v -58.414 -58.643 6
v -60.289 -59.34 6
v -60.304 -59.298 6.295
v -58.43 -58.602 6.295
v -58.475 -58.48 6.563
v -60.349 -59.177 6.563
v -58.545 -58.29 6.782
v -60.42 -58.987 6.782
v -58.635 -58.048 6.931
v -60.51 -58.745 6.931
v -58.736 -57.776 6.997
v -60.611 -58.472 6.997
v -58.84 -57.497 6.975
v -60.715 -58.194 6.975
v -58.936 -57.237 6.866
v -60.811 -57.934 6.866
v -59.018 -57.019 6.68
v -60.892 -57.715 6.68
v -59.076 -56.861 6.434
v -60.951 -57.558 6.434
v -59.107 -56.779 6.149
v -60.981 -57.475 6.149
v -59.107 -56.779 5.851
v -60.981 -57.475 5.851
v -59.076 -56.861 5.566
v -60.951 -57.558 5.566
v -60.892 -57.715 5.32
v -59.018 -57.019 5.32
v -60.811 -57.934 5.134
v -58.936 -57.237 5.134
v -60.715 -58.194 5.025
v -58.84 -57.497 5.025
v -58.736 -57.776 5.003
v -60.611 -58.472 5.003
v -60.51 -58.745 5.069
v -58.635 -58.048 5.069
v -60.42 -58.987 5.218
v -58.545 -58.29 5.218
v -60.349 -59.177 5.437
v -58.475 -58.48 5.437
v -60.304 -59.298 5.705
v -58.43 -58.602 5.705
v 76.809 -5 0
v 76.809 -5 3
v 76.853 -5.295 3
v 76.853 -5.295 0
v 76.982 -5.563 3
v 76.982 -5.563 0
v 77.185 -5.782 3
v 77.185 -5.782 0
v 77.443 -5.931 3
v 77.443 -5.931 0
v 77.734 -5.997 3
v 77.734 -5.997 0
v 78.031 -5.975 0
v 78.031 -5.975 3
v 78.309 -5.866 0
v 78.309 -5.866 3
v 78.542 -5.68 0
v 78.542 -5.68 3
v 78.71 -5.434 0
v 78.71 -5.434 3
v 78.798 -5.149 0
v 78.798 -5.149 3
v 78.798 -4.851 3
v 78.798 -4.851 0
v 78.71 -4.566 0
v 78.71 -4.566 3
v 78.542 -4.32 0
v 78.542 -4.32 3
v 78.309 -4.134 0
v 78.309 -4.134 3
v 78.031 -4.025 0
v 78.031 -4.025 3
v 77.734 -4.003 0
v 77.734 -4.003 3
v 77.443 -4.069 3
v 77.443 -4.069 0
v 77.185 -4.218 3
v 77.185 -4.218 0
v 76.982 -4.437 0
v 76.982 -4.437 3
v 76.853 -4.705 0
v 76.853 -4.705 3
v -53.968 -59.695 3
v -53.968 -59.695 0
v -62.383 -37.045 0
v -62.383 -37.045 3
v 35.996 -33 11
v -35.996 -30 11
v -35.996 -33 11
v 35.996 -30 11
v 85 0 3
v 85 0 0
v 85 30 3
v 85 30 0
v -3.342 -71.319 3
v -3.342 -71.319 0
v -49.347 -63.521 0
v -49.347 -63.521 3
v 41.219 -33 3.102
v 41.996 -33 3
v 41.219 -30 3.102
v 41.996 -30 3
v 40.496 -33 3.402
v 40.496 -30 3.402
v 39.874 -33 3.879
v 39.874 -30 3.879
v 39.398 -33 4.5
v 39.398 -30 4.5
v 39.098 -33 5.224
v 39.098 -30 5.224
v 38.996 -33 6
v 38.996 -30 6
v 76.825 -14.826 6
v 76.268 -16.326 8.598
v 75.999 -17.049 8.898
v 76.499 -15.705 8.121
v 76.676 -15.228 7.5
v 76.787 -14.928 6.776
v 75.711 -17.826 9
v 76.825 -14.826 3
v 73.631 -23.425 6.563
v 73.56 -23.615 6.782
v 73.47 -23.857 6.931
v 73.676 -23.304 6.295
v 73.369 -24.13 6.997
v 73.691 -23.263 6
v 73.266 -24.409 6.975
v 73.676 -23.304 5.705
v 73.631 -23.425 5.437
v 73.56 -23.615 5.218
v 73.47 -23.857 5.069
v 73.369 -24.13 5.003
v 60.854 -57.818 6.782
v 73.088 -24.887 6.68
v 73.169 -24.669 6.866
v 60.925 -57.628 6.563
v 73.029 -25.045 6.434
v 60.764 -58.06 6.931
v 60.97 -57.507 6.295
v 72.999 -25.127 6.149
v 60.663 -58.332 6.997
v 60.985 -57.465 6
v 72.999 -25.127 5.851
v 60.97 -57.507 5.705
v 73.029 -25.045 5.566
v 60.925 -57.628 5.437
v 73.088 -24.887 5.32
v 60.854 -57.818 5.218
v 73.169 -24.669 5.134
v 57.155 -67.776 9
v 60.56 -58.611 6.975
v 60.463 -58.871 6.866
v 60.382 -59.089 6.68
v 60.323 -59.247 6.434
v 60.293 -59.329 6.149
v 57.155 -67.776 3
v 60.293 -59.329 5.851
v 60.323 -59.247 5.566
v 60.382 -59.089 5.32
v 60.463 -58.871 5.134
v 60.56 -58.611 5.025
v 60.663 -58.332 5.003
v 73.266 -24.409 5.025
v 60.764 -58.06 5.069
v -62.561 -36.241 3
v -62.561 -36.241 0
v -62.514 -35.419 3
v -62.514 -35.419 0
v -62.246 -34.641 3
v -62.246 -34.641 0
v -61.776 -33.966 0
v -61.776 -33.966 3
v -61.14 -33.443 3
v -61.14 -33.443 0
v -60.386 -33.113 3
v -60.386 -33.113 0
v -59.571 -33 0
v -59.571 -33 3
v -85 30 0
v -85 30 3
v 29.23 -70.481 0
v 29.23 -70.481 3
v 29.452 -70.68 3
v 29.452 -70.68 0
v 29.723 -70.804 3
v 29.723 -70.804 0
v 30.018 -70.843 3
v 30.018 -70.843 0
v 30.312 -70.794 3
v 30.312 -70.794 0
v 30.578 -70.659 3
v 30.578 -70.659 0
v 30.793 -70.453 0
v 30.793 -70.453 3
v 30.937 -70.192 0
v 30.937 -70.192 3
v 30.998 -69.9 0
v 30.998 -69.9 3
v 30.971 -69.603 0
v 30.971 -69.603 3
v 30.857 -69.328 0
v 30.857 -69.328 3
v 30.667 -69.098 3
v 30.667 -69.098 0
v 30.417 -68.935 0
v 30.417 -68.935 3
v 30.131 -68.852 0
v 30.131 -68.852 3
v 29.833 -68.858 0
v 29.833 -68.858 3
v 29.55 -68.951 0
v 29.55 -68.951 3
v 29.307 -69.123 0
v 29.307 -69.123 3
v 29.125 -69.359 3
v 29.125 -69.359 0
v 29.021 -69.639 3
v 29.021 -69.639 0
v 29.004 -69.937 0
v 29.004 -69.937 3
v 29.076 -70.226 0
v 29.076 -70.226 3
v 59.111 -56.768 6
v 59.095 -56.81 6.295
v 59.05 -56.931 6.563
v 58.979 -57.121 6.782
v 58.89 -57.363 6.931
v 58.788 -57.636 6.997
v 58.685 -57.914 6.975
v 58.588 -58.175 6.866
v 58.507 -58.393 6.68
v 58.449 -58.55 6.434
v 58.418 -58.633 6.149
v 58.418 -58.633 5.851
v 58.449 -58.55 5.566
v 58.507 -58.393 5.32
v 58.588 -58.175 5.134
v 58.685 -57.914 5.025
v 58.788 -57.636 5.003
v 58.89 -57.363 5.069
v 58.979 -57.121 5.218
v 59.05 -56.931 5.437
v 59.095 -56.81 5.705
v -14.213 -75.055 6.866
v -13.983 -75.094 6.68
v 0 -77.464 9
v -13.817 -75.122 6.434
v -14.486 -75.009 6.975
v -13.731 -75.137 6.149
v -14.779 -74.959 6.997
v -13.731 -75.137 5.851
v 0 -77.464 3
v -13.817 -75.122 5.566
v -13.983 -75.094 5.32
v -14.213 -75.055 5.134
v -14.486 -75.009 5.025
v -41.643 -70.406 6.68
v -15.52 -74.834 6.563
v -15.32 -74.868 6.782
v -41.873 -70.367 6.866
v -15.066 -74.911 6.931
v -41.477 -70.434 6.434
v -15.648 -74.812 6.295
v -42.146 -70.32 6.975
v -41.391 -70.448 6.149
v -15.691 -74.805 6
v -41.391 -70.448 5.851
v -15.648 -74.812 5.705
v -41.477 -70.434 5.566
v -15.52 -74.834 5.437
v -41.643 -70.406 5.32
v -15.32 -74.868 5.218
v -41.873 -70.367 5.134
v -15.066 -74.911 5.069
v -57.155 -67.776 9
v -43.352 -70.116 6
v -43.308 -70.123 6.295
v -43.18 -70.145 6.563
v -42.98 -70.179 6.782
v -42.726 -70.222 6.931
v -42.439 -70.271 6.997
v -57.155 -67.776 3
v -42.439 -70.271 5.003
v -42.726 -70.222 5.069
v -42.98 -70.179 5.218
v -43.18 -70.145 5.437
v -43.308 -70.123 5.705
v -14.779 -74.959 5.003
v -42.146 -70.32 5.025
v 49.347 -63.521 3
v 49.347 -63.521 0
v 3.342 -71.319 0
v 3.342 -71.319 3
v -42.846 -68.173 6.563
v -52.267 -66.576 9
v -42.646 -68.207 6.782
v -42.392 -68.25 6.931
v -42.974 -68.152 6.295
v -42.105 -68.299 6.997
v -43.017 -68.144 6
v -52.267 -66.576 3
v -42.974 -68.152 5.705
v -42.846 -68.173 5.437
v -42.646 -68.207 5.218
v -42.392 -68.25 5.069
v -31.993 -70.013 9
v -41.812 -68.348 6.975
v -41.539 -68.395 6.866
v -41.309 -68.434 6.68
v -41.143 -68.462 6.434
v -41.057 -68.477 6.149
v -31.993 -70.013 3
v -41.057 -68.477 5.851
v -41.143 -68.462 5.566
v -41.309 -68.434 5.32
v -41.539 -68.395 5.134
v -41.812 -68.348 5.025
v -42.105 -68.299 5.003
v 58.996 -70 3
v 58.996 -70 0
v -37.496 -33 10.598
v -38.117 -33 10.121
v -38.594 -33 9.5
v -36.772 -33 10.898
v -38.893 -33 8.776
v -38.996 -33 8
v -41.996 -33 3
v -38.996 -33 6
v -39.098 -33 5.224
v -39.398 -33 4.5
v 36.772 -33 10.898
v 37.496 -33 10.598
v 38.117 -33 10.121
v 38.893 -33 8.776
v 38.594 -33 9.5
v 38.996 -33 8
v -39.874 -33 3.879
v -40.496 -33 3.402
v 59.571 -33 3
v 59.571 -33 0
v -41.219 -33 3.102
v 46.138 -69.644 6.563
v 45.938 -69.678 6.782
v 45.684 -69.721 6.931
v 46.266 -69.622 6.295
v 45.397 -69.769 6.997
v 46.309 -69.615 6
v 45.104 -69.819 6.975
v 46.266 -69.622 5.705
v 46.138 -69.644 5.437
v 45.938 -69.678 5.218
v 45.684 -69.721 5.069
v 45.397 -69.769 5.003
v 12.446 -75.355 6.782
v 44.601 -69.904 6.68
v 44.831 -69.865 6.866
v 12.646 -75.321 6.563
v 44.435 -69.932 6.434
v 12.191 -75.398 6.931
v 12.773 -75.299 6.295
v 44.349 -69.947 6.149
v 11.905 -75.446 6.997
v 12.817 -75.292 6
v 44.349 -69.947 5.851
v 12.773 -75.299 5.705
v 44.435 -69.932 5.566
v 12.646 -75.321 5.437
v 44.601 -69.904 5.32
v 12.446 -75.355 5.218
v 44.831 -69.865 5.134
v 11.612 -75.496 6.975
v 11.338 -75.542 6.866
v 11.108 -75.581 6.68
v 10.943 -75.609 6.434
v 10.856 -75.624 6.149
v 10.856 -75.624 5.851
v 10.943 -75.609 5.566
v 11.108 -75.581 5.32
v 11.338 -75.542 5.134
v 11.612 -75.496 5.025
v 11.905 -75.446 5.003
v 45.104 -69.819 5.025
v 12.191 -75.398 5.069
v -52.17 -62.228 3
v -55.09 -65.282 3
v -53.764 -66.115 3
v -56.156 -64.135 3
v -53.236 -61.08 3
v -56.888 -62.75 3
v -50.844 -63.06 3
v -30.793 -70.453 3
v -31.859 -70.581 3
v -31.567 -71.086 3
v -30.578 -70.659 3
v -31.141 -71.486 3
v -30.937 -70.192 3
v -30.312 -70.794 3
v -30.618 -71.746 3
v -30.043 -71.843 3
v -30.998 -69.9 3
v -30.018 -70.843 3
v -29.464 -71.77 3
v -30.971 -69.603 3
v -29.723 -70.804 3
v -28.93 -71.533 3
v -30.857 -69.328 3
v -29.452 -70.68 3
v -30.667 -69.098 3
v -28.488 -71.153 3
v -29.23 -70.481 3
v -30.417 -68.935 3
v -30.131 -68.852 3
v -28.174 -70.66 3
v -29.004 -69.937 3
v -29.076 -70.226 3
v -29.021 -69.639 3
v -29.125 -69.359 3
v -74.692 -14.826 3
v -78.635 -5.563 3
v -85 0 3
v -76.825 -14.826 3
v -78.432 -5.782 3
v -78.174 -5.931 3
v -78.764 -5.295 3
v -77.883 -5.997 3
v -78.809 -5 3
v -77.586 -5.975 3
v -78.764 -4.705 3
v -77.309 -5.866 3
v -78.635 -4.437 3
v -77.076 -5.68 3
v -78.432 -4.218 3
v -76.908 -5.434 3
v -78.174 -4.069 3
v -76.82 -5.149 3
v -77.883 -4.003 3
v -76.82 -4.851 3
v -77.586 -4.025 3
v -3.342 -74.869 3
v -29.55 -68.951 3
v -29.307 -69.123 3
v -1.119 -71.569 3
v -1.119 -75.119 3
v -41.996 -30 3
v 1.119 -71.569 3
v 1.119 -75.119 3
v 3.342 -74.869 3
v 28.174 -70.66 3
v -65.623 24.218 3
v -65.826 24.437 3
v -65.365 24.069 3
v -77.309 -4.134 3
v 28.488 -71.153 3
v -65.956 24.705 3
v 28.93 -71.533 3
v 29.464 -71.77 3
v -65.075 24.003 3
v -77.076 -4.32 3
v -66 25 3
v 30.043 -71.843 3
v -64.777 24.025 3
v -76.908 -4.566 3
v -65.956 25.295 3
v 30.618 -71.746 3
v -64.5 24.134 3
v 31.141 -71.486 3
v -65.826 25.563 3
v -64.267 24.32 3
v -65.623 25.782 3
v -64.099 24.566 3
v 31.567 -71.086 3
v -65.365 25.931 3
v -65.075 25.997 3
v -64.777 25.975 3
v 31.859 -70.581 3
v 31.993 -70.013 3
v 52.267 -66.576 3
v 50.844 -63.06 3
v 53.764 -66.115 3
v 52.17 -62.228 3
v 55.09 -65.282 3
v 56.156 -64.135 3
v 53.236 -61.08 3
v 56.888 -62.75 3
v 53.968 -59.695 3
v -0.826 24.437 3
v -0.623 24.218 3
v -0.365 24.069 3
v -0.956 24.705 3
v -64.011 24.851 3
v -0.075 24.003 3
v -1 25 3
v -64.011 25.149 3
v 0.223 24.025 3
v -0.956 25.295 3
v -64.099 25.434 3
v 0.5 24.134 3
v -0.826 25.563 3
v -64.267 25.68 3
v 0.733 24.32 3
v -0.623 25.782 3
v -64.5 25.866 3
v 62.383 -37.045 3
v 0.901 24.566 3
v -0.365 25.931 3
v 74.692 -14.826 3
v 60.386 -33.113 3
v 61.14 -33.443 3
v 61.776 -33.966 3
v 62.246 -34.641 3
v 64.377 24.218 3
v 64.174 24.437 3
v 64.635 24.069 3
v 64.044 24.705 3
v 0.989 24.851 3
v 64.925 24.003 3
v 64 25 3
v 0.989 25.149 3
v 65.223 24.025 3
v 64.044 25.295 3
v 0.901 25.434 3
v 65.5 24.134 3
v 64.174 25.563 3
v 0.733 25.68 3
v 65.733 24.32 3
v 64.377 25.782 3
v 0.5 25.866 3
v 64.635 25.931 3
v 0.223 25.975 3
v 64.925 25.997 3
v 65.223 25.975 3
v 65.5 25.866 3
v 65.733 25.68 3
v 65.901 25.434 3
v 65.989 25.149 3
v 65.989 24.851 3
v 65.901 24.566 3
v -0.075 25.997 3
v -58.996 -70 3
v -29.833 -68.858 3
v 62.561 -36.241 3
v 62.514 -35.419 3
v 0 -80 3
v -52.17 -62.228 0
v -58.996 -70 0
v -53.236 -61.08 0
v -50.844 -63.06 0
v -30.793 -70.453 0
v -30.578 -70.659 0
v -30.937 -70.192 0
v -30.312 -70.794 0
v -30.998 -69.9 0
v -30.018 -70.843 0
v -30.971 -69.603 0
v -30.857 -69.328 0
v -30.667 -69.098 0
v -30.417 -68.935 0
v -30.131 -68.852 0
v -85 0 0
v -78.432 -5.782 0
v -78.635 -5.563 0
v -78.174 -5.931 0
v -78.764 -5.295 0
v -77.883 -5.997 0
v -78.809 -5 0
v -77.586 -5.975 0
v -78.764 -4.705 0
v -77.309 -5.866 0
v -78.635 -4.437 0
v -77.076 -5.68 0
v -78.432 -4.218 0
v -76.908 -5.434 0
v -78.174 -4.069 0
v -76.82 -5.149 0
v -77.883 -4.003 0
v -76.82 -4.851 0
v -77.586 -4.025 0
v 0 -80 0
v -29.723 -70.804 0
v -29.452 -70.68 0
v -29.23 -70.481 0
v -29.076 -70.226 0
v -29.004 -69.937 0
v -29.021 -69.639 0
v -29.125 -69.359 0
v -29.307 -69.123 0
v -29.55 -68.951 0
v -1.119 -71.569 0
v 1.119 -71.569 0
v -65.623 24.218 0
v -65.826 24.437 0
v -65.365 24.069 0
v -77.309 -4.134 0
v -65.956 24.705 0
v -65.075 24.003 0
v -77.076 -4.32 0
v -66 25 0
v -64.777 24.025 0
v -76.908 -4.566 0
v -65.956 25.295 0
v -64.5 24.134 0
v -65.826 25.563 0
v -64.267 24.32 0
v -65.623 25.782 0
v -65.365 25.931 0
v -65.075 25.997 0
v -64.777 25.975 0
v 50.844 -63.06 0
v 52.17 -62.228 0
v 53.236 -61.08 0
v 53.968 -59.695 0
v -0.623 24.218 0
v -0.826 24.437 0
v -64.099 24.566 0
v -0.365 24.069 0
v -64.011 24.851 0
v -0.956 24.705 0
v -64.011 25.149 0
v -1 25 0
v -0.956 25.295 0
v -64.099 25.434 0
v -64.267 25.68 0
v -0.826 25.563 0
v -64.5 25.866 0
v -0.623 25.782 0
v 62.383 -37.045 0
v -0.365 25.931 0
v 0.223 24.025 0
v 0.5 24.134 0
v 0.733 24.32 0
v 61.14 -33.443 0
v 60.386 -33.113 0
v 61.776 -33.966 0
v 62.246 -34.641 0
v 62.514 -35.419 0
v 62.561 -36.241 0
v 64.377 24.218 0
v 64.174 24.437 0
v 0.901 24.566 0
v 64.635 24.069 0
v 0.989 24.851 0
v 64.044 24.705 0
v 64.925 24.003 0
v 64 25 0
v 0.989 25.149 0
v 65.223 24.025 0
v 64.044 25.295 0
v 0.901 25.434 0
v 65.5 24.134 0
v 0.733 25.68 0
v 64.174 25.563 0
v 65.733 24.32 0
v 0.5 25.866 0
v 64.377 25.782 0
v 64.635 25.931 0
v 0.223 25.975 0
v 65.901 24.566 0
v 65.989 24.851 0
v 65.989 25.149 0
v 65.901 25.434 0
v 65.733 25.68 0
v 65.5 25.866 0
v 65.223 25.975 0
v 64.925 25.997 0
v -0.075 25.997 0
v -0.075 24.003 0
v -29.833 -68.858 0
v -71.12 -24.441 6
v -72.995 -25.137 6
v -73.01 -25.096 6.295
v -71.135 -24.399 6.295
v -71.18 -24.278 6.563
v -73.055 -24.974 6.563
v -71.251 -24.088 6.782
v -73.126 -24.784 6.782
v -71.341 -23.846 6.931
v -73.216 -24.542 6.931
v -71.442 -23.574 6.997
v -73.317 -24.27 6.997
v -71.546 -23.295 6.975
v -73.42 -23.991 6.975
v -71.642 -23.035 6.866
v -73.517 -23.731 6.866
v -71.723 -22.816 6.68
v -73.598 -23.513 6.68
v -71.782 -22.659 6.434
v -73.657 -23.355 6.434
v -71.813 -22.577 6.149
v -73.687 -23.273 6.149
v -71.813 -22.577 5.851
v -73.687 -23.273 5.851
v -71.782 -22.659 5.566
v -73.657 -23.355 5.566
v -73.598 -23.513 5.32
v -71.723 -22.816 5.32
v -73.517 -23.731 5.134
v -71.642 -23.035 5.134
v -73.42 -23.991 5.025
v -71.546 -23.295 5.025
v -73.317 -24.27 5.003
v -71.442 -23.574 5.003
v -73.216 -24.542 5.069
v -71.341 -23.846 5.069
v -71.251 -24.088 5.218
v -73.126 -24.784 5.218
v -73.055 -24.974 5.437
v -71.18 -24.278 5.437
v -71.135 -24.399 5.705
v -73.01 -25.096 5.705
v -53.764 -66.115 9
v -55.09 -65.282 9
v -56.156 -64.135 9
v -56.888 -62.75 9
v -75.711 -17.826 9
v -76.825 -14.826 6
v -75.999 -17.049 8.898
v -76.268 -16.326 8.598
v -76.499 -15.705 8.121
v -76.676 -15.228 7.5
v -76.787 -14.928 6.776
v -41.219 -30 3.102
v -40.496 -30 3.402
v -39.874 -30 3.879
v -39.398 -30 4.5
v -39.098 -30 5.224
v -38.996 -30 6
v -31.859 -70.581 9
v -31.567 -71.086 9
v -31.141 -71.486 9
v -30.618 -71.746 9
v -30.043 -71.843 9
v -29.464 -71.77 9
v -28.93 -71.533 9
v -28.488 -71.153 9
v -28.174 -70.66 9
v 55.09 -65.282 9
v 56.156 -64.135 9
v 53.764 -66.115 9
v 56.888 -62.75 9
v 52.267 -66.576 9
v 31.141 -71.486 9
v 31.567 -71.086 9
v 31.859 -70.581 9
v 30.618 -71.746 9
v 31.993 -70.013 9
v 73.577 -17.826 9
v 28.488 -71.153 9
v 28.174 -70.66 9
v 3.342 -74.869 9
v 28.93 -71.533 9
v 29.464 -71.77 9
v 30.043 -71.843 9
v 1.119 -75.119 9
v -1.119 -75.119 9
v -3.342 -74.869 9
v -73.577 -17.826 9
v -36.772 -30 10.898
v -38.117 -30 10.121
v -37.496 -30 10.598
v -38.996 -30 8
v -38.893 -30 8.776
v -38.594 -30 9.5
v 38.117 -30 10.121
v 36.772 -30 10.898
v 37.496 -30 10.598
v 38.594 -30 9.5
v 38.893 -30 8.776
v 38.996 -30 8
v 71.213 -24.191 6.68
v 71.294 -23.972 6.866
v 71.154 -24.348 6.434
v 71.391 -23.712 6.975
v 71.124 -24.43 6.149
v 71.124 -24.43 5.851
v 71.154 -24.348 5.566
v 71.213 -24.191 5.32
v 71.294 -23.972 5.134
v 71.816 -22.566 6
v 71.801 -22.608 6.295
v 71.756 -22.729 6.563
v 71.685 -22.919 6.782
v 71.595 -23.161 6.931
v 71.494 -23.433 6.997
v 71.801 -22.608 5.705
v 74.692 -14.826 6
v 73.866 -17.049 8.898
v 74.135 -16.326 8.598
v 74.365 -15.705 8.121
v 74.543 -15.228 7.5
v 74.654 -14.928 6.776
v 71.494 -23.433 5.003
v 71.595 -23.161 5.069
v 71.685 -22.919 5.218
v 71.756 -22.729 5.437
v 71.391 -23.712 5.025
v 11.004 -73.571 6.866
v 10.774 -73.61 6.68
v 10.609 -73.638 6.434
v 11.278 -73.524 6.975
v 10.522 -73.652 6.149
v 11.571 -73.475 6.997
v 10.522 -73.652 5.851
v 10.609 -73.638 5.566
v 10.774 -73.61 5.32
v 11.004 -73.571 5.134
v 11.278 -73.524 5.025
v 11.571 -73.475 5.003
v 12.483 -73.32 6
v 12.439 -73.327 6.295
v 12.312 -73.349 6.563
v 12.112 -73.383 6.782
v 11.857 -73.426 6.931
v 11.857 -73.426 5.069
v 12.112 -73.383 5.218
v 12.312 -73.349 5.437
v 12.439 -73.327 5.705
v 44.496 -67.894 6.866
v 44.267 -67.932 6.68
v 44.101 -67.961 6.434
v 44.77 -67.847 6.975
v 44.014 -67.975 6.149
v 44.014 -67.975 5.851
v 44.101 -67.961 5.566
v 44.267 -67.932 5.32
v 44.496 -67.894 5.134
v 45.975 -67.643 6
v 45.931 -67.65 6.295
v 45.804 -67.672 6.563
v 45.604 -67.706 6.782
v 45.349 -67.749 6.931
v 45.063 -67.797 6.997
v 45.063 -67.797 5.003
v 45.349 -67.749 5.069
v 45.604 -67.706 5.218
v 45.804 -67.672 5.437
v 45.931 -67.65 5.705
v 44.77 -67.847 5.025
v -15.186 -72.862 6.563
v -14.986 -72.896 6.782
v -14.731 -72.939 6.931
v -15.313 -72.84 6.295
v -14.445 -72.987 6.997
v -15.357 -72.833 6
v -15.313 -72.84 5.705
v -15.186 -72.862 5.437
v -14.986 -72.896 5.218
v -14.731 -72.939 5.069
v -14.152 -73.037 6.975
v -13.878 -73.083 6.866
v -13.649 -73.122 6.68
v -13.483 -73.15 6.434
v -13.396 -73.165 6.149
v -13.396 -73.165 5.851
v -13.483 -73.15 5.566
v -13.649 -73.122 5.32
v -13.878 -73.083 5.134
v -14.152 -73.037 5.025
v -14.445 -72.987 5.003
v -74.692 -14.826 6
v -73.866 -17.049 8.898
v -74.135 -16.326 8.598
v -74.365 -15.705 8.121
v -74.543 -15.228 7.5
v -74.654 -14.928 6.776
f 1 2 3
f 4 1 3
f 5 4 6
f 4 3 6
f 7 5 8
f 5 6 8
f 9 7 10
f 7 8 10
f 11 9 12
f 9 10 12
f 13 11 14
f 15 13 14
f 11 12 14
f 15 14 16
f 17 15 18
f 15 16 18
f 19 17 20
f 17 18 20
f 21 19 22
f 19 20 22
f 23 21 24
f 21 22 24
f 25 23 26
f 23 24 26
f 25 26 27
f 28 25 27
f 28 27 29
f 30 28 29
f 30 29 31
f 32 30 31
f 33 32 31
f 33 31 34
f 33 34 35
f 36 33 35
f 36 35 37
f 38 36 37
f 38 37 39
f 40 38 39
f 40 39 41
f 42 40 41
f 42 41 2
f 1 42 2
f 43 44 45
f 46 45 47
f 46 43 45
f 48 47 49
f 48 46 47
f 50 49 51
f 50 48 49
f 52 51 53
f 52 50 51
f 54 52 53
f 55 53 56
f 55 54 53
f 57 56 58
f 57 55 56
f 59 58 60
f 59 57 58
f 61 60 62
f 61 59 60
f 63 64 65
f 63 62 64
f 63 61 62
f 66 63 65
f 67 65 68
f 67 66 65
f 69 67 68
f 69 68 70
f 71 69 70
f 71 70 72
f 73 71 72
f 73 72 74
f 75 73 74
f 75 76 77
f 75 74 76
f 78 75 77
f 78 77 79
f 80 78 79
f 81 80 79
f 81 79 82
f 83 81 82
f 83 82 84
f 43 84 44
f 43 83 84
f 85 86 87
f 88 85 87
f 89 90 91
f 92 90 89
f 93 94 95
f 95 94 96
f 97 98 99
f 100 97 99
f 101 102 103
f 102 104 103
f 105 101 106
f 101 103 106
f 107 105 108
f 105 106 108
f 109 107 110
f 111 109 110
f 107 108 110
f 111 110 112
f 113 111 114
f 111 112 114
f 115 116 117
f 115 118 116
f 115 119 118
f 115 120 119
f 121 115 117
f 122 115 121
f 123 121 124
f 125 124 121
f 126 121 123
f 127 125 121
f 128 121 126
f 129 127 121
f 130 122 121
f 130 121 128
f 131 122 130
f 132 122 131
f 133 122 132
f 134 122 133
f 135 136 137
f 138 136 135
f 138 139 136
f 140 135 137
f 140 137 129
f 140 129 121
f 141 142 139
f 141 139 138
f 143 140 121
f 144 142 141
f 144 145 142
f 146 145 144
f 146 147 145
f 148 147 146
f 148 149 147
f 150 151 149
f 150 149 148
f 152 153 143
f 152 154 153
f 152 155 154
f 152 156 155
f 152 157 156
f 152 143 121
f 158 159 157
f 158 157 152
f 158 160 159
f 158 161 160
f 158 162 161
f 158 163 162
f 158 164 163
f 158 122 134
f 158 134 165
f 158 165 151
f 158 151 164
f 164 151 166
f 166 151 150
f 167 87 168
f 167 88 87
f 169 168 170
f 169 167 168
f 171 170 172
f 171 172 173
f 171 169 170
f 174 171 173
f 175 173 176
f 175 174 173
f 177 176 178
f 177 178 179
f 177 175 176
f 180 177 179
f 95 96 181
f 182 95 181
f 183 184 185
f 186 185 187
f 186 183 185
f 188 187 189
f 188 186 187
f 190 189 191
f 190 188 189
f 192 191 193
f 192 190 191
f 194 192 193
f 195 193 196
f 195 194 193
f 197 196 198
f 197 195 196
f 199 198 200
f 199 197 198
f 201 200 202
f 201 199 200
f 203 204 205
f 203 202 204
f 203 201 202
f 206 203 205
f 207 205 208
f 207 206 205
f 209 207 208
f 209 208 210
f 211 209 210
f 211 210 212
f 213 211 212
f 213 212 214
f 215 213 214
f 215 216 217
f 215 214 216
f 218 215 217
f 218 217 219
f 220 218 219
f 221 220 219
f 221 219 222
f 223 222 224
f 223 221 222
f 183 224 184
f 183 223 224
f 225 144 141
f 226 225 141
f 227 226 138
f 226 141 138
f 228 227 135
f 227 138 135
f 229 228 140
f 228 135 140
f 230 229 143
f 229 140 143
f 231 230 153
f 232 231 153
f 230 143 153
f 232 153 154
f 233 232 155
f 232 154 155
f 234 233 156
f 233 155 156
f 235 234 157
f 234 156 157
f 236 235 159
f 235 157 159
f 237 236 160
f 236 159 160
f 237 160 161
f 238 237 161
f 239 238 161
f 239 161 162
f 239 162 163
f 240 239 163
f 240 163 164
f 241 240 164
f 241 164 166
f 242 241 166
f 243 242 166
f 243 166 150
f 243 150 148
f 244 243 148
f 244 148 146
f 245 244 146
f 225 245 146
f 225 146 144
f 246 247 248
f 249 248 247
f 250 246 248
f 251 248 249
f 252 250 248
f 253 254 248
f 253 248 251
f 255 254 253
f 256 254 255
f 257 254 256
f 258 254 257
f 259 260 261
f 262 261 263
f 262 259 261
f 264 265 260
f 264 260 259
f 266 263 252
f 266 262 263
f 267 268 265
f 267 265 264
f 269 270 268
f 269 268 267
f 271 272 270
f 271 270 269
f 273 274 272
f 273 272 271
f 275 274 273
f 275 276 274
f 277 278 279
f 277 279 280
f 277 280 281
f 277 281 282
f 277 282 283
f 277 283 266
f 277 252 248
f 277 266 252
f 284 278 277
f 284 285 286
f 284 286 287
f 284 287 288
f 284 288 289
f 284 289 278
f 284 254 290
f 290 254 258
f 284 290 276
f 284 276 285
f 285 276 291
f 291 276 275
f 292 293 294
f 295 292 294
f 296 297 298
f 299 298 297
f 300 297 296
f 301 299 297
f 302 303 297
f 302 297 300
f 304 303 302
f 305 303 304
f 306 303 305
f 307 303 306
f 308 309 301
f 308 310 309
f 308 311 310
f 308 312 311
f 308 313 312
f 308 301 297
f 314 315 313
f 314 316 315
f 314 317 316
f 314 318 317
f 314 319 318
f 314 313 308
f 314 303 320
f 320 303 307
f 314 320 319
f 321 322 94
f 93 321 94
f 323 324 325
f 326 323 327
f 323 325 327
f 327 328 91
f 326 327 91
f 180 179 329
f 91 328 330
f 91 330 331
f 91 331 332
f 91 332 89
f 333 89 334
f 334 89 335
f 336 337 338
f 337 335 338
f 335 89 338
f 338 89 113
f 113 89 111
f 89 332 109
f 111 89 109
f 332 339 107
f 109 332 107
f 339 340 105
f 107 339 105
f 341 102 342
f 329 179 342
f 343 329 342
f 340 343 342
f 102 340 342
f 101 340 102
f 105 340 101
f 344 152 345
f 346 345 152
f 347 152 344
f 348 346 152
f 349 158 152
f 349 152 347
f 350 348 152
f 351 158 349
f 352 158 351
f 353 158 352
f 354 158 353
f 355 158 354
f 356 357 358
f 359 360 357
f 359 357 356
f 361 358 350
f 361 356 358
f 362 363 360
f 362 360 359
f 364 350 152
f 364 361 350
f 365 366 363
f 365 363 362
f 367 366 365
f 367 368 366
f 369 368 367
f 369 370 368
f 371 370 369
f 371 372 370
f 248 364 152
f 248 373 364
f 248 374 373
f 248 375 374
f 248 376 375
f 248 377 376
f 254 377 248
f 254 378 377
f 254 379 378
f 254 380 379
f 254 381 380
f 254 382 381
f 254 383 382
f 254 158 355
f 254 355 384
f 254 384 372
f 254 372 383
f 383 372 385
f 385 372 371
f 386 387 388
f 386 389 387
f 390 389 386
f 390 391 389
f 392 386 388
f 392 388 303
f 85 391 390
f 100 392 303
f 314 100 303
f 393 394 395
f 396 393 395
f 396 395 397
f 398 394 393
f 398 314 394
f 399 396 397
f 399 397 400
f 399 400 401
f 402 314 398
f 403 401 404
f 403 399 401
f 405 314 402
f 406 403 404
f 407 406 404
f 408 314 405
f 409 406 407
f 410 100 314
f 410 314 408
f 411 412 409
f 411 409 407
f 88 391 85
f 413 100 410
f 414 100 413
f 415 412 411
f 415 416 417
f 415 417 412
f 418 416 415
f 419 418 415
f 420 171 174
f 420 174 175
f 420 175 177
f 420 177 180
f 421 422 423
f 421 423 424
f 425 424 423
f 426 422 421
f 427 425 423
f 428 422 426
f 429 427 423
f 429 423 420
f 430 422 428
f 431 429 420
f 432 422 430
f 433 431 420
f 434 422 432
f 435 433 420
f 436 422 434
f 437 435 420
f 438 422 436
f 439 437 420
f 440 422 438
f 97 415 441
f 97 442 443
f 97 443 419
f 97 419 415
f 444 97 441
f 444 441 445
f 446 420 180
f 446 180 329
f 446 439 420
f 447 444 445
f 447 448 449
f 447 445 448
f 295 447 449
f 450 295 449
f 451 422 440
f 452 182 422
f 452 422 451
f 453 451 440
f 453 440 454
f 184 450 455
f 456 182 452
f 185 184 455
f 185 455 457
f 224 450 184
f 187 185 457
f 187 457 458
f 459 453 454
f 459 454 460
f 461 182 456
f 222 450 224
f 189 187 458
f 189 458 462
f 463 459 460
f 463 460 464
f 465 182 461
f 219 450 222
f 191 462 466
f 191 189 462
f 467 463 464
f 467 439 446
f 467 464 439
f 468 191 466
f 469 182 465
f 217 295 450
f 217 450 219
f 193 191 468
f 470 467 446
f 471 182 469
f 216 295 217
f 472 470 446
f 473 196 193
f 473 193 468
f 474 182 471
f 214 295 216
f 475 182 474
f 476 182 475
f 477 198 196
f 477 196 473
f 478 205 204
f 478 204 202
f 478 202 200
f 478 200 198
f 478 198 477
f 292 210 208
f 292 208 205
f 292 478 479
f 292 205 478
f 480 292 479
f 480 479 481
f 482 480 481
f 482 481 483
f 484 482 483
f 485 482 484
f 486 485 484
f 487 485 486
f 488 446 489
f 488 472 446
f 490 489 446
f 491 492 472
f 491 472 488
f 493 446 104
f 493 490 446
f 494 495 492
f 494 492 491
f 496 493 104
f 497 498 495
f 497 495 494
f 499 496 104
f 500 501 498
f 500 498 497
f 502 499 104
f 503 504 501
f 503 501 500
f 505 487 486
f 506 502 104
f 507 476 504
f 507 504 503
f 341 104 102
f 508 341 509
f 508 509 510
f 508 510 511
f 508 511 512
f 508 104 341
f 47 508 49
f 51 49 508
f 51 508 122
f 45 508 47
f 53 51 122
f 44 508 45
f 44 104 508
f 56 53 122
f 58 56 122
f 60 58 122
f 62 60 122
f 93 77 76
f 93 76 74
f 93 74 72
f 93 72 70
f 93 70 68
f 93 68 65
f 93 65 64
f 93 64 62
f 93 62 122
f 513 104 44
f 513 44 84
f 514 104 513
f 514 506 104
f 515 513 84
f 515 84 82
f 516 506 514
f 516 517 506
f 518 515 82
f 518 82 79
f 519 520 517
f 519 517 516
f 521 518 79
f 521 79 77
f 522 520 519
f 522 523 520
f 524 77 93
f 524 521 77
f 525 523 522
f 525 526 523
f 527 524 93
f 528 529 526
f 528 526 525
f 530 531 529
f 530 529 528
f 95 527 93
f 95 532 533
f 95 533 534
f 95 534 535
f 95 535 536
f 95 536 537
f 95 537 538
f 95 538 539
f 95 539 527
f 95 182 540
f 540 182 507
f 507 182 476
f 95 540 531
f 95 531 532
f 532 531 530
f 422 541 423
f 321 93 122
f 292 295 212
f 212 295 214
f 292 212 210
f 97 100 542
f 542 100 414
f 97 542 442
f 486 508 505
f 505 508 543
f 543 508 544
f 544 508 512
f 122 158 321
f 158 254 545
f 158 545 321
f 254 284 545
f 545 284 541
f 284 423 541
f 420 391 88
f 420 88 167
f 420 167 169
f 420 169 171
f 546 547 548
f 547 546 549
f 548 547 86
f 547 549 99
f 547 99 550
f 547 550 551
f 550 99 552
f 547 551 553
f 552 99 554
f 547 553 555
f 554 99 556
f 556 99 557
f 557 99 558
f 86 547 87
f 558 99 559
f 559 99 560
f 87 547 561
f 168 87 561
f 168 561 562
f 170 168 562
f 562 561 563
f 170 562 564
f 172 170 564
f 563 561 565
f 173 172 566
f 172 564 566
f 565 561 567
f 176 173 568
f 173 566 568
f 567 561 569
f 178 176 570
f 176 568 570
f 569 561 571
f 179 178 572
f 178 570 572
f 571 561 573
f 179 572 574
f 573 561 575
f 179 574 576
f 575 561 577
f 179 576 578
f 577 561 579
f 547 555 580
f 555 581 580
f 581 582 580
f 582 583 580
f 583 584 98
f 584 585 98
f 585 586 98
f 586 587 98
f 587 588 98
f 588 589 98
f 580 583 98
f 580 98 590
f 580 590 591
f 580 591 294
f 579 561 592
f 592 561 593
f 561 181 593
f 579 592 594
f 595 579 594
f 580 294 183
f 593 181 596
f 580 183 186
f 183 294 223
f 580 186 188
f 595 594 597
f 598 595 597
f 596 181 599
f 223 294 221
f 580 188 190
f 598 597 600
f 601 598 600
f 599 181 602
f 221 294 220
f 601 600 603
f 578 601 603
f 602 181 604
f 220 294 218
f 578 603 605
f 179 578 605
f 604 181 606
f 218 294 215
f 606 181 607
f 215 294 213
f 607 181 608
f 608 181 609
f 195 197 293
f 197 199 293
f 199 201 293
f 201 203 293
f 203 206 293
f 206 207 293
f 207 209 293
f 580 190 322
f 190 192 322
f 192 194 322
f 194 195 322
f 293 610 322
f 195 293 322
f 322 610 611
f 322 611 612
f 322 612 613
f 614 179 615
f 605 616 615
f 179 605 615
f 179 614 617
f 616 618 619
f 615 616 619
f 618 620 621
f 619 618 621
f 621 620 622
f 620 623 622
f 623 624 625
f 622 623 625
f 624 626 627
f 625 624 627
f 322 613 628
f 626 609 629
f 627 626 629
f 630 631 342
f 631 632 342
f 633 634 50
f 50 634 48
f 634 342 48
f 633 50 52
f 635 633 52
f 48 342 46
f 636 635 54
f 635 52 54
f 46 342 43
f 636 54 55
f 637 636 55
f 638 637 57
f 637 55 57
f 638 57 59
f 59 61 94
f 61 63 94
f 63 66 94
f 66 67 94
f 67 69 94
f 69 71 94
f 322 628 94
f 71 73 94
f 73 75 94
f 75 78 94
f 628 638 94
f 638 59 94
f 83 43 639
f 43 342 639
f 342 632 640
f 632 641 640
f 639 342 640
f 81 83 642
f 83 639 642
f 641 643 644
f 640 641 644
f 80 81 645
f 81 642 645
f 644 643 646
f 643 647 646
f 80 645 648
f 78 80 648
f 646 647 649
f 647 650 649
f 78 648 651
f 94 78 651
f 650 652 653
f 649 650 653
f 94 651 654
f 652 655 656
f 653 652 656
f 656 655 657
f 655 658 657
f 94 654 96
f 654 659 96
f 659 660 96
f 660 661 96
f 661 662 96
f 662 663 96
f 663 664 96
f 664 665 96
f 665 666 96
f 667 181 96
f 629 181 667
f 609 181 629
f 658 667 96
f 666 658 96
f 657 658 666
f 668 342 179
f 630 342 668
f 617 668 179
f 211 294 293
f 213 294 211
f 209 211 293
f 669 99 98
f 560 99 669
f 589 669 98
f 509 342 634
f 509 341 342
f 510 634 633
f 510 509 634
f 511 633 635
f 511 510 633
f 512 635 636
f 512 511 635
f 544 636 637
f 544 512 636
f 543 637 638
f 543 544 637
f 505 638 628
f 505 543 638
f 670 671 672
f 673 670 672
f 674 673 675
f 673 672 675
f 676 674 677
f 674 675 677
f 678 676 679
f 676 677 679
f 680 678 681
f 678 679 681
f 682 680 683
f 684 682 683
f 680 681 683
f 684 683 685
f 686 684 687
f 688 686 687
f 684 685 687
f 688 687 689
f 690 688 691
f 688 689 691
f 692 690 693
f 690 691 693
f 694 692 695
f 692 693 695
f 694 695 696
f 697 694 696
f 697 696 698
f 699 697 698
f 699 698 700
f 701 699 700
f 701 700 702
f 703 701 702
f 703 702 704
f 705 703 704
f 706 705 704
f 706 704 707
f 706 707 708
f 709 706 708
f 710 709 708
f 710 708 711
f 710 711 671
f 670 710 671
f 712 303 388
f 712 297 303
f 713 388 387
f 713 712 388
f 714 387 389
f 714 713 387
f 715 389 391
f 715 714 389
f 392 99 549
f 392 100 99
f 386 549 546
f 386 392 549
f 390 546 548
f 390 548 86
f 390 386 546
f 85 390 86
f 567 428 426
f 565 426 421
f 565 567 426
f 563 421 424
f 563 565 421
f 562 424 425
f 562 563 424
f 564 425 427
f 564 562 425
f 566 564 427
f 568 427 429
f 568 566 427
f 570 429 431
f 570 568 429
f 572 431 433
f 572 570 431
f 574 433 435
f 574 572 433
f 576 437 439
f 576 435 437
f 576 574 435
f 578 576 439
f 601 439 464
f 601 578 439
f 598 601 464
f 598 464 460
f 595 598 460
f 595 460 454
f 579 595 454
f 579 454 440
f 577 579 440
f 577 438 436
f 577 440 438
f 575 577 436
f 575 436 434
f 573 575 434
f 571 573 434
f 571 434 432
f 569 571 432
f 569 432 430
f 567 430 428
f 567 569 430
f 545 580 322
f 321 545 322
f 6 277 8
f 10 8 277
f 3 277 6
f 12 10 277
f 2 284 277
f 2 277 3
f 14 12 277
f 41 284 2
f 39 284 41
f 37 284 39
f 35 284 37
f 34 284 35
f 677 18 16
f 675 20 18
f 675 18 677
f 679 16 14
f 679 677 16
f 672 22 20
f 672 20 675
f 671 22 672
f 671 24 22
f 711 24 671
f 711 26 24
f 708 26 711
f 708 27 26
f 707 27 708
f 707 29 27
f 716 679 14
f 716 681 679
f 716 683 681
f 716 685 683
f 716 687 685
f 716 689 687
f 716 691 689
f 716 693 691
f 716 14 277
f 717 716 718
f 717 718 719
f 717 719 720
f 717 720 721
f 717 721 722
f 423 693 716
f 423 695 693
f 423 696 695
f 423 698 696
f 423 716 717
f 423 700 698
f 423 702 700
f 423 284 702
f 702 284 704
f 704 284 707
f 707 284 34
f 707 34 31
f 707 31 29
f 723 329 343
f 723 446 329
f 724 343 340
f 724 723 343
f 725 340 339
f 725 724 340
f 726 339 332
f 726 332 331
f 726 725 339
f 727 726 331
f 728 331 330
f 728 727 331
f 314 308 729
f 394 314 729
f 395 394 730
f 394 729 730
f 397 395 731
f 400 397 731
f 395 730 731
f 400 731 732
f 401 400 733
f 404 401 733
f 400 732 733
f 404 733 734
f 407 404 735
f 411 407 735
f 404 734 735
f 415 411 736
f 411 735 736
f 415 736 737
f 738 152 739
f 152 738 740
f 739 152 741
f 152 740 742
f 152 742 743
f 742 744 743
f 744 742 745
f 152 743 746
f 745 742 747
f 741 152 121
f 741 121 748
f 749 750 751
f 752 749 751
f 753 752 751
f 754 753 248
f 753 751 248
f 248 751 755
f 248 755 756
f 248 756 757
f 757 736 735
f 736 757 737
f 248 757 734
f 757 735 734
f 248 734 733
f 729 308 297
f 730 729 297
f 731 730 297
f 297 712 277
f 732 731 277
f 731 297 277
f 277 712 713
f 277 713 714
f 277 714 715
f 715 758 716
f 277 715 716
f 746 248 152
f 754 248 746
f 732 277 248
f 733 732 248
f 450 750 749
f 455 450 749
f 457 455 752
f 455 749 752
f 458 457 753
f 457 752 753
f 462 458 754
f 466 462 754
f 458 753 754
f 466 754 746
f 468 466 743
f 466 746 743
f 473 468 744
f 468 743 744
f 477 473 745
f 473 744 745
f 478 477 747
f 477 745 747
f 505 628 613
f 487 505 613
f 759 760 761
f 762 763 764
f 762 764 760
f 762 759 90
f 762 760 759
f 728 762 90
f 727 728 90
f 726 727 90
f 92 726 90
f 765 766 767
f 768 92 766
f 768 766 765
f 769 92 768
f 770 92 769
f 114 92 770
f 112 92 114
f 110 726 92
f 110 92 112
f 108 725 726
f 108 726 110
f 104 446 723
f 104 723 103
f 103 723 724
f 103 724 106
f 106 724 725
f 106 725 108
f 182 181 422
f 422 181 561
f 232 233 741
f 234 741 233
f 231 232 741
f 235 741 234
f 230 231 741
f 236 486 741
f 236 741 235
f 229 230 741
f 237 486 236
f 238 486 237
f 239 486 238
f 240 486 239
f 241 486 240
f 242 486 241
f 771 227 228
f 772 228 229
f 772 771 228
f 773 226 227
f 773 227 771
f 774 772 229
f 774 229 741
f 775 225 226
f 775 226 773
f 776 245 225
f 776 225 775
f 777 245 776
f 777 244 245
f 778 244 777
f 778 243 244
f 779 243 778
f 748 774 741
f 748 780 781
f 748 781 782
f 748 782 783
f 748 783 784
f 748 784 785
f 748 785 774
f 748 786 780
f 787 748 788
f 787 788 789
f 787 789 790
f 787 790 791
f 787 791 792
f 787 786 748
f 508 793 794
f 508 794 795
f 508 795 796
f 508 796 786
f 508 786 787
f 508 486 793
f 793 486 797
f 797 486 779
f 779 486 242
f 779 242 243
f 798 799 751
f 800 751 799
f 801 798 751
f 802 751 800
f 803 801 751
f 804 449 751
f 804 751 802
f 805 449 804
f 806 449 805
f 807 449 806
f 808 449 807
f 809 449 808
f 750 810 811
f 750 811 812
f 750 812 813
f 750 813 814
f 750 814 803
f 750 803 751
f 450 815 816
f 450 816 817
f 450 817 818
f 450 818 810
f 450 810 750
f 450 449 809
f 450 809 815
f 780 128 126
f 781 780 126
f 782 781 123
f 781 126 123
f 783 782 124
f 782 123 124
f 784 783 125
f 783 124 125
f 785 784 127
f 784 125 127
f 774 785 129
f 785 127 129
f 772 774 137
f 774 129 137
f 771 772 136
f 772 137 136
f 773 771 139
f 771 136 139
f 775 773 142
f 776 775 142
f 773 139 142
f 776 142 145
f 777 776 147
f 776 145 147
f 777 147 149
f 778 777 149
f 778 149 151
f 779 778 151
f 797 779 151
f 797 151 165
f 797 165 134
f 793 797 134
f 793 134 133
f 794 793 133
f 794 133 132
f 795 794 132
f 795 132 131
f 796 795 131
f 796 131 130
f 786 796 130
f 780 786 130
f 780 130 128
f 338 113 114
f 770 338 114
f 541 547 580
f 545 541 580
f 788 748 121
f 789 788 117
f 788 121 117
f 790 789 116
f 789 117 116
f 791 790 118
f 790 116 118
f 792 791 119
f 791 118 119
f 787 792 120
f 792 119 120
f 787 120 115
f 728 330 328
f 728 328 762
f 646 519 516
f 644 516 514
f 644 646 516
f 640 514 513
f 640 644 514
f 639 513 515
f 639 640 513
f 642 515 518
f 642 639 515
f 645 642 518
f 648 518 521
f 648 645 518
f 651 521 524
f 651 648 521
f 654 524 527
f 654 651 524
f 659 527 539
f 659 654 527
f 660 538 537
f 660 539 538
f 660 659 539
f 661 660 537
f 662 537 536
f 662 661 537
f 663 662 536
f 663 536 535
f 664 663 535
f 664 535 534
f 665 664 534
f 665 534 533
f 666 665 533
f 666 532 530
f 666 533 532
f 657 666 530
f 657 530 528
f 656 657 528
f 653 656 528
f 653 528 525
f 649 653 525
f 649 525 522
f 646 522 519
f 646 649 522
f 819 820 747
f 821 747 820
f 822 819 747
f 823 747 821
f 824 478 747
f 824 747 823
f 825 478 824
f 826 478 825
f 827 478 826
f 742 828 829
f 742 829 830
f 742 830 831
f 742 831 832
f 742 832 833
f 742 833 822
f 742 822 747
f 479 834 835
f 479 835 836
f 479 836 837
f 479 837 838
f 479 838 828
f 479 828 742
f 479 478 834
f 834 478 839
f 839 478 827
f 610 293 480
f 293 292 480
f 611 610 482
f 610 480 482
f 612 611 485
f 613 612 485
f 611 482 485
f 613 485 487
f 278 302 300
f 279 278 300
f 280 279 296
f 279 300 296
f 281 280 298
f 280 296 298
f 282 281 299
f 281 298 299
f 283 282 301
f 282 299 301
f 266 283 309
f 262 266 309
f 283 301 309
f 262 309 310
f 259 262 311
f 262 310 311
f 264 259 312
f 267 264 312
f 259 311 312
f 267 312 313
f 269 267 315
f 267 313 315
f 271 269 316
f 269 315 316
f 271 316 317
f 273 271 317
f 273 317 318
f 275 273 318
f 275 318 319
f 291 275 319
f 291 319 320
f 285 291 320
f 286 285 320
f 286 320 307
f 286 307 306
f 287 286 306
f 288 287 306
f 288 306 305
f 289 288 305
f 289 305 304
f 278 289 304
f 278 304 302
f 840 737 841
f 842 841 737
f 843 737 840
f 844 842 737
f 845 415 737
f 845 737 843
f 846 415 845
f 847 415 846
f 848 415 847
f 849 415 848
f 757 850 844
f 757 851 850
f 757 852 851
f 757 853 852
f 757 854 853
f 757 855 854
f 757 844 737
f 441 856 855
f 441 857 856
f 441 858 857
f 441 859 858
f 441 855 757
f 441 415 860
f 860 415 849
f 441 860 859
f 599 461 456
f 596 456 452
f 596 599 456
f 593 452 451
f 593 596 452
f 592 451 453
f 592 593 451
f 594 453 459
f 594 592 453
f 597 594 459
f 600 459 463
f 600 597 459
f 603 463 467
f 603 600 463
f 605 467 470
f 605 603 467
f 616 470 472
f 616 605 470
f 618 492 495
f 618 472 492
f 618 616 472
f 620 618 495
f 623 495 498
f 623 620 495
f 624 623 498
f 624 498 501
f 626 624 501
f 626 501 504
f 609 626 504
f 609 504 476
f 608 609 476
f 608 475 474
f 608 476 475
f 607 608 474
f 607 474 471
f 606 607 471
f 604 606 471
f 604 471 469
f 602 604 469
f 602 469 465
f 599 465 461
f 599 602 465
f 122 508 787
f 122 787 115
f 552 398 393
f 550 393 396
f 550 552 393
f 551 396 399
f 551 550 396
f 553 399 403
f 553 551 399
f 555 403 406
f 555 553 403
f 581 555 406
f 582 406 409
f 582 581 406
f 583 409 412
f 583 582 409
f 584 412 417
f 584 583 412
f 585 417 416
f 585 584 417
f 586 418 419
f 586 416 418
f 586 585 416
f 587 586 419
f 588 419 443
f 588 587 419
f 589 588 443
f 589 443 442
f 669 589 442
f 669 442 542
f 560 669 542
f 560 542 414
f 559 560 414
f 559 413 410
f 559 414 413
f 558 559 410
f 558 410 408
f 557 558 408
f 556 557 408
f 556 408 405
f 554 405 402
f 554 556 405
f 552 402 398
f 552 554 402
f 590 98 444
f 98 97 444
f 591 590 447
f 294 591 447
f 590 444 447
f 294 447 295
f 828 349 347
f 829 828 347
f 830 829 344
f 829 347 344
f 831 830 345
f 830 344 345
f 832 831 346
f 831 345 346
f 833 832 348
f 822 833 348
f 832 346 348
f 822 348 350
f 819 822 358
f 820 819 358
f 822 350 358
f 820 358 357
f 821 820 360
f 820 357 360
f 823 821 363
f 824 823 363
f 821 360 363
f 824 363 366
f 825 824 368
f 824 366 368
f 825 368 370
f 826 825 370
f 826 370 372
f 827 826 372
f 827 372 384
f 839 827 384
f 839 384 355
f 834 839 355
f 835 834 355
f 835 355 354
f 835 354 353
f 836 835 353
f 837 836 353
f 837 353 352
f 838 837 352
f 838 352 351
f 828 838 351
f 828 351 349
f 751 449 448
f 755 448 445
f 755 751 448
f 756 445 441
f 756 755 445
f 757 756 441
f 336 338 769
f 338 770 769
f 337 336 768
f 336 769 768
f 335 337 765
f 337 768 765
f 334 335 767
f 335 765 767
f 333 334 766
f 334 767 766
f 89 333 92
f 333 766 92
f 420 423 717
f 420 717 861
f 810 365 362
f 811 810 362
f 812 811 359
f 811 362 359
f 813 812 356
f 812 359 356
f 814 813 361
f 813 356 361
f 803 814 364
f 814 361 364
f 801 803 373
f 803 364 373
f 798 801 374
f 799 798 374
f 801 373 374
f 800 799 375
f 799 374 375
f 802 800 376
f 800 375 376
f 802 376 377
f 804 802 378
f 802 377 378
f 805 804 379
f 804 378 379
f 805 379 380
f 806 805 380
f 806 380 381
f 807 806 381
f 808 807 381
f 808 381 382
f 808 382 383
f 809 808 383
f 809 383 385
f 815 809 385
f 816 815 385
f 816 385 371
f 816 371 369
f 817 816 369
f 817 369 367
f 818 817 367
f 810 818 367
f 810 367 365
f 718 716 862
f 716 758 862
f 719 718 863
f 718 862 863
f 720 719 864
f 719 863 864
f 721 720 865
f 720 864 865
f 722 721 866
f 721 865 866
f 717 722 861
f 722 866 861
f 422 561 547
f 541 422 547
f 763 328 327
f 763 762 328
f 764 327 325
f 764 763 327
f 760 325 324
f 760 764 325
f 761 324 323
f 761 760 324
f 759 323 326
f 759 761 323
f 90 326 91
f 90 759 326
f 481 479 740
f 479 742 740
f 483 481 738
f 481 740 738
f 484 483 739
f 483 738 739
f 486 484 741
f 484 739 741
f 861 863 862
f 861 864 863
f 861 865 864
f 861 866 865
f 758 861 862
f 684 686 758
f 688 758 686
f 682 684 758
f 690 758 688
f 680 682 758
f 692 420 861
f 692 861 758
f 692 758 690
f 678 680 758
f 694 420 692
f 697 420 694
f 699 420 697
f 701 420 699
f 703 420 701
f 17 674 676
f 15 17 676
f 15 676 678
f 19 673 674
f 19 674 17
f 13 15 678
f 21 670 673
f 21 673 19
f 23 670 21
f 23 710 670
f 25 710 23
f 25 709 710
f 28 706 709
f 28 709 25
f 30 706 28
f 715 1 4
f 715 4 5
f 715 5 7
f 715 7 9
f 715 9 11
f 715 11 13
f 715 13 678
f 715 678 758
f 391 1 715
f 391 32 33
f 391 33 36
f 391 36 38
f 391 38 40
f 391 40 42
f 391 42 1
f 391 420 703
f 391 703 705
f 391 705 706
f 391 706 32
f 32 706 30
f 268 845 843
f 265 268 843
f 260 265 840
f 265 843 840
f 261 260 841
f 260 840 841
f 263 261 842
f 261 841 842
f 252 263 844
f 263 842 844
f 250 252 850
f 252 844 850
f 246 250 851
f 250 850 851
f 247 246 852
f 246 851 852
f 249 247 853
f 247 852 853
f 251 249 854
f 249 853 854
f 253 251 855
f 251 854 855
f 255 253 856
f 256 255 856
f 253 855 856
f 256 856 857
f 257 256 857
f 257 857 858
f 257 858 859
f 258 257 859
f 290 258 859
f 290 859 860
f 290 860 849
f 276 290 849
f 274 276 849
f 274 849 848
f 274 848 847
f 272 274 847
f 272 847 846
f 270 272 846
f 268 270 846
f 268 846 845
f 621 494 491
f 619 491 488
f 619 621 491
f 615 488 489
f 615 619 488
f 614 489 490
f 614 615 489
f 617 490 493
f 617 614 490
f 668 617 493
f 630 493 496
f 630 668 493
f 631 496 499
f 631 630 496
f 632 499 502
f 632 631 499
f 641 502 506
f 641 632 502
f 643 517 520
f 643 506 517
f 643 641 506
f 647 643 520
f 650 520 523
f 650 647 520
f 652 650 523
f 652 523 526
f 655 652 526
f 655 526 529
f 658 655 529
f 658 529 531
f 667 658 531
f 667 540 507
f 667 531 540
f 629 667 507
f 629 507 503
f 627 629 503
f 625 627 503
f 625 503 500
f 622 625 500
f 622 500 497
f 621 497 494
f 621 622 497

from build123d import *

# Parameters (mm, degrees)
BOSS_EXTRUDE1_DEPTH     = 3
BOSS_EXTRUDE2_DEPTH     = 6
FILLET1_R               = 20
FILLET2_R               = 6
FILLET4_R               = 3
SKETCH4_W               = 77.991272398
SKETCH4_H               = 3
BOSS_EXTRUDE3_DEPTH     = 8
FILLET5_R               = 3
CUT_EXTRUDE1_DEPTH      = 118
CUT_EXTRUDE1_DEPTH_BACK = 3
SKETCH5_R               = 1
SKETCH6_R               = 2
CUT_EXTRUDE2_DEPTH      = 6
FILLET6_R               = 3
SKETCH7_R               = 1
CUT_EXTRUDE3_DEPTH      = 3
SKETCH8_R               = 1
CUT_EXTRUDE4_DEPTH      = 3
SKETCH9_R               = 1
CUT_EXTRUDE5_DEPTH      = 3
SKETCH10_R              = 1
CUT_EXTRUDE6_DEPTH      = 3


with BuildPart() as part:
    # Sketch2 → Boss-Extrude1 (new body)
    with BuildSketch(Plane.XY):
        Polygon((85, 0), (85, 30), (-85, 30), (-85, 0), (-58.995636199, -70), (0, -80), (58.995636199, -70), align=None)
        Polygon((63.885527266, -33), (52.762165892, -62.942485887), (0, -71.885887347), (-52.762165892, -62.942485887), (-63.885527266, -33), align=None, mode=Mode.SUBTRACT)
    extrude(amount=BOSS_EXTRUDE1_DEPTH)

    # Sketch3 → Boss-Extrude2 (add)
    with BuildSketch(Plane.XY.offset(3)):
        Polygon((-74.691839611, -14.825881059), (-55.682056872, -65.99747679), (0, -75.435811633), (55.682056872, -65.99747679), (74.691839611, -14.825881059), (76.82538642, -14.825881059), (57.154758795, -67.776375994), (0, -77.464339796), (-57.154758795, -67.776375994), (-76.82538642, -14.825881059), align=None)
    extrude(amount=BOSS_EXTRUDE2_DEPTH)

    # Fillet1
    fillet1_edges = [part.edges().sort_by_distance(p)[0] for p in [
        (0, -71.885887347, 1.5),
        (0, -75.435811633, 6),
    ]]
    fillet(fillet1_edges, radius=FILLET1_R)

    # Fillet2
    fillet2_edges = [part.edges().sort_by_distance(p)[0] for p in [
        (-52.762165892, -62.942485887, 1.5),
        (52.762165892, -62.942485887, 1.5),
        (55.682056872, -65.99747679, 6),
        (-55.682056872, -65.99747679, 6),
    ]]
    fillet(fillet2_edges, radius=FILLET2_R)

    # Fillet4
    fillet4_edges = [part.edges().sort_by_distance(p)[0] for p in [
        (63.885527266, -33, 1.5),
        (-63.885527266, -33, 1.5),
    ]]
    fillet(fillet4_edges, radius=FILLET4_R)

    # Sketch4 → Boss-Extrude3 (add)
    with BuildSketch(Plane.XY.offset(3)):
        with Locations((0, -31.5)):
            Rectangle(SKETCH4_W, SKETCH4_H)
    extrude(amount=BOSS_EXTRUDE3_DEPTH)

    # Fillet5
    fillet5_edges = [part.edges().sort_by_distance(p)[0] for p in [
        (-38.995636199, -31.5, 3),
        (38.995636199, -31.5, 3),
        (-38.995636199, -31.5, 11),
        (38.995636199, -31.5, 11),
    ]]
    fillet(fillet5_edges, radius=FILLET5_R)

    # Sketch5 → Cut-Extrude1 (cut, two sides: drawn at the far end of the back side and taken through both)
    with BuildSketch(Plane.XY.offset(3).offset(-CUT_EXTRUDE1_DEPTH_BACK)):
        with Locations(Location((-65, 25, 0), (0, 0, 180))):
            Circle(SKETCH5_R)
        with Locations(Location((65, 25, 0), (0, 0, 180))):
            Circle(SKETCH5_R)
        with Locations(Location((0, 25, 0), (0, 0, 180))):
            Circle(SKETCH5_R)
        with Locations(Location((-77.808678419, -5, 0), (0, 0, 180))):
            Circle(SKETCH5_R)
        with Locations(Location((77.808678419, -5, 0), (0, 0, 180))):
            Circle(SKETCH5_R)
        with Locations(Location((-30, -69.84355772, 0), (0, 0, 200.379573945))):
            Circle(SKETCH5_R)
        with Locations(Location((30, -69.84355772, 0), (0, 0, 219.620426055))):
            Circle(SKETCH5_R)
    extrude(amount=CUT_EXTRUDE1_DEPTH + CUT_EXTRUDE1_DEPTH_BACK, mode=Mode.SUBTRACT)

    # Sketch6 → Cut-Extrude2 (cut)
    with BuildSketch(Plane.XY.offset(9)):
        with Locations((30, -69.84355772)):
            Circle(SKETCH6_R)
        with Locations((-30, -69.84355772)):
            Circle(SKETCH6_R)
    extrude(amount=-CUT_EXTRUDE2_DEPTH, mode=Mode.SUBTRACT)

    # Fillet6
    fillet6_edges = [part.edges().sort_by_distance(p)[0] for p in [
        (-75.758613015, -14.825881059, 9),
        (75.758613015, -14.825881059, 9),
    ]]
    fillet(fillet6_edges, radius=FILLET6_R)

    # Sketch7 → Cut-Extrude3 (cut)
    with BuildSketch(Plane(origin=(-72.348566579, -26.876834941, 0), x_dir=(0, 0, 1), z_dir=(-0.9374061965324084, -0.3482378823486089, 0))):
        with Locations(Location((6, 2.855637104, 0), (0, 0, 270))):
            Circle(SKETCH7_R)
        with Locations(Location((6, -33.630542667, 0), (0, 0, 270))):
            Circle(SKETCH7_R)
    extrude(amount=-CUT_EXTRUDE3_DEPTH, mode=Mode.SUBTRACT)

    # Sketch8 → Cut-Extrude4 (cut)
    with BuildSketch(Plane(origin=(72.348566579, -26.876834941, 0), x_dir=(0, 0, -1), z_dir=(0.9374061965324085, -0.3482378823486088, 0))):
        with Locations(Location((-6, 2.855637104, 0), (0, 0, 90))):
            Circle(SKETCH8_R)
        with Locations(Location((-6, -33.630542667, 0), (0, 0, 90))):
            Circle(SKETCH8_R)
    extrude(amount=-CUT_EXTRUDE4_DEPTH, mode=Mode.SUBTRACT)

    # Sketch9 → Cut-Extrude5 (cut)
    with BuildSketch(Plane(origin=(-12.429555178, -73.328951536, 0), x_dir=(0.9859365210363187, -0.1671202455922104, 0), z_dir=(0.1671202455922104, 0.9859365210363187, 0))):
        with Locations(Location((-1.969388477, -6, 0), (0, 0, 180))):
            Circle(SKETCH9_R)
        with Locations(Location((-30.024159445, -6, 0), (0, 0, 180))):
            Circle(SKETCH9_R)
    extrude(amount=-CUT_EXTRUDE5_DEPTH, mode=Mode.SUBTRACT)

    # Sketch10 → Cut-Extrude6 (cut)
    with BuildSketch(Plane(origin=(12.763795669, -75.300824578, 0), x_dir=(0.9859365210363187, 0.1671202455922103, 0), z_dir=(0.1671202455922103, -0.9859365210363187, 0))):
        with Locations((-0.945859491, 6)):
            Circle(SKETCH10_R)
        with Locations((33.024159445, 6)):
            Circle(SKETCH10_R)
    extrude(amount=-CUT_EXTRUDE6_DEPTH, mode=Mode.SUBTRACT)


solid = part.part
